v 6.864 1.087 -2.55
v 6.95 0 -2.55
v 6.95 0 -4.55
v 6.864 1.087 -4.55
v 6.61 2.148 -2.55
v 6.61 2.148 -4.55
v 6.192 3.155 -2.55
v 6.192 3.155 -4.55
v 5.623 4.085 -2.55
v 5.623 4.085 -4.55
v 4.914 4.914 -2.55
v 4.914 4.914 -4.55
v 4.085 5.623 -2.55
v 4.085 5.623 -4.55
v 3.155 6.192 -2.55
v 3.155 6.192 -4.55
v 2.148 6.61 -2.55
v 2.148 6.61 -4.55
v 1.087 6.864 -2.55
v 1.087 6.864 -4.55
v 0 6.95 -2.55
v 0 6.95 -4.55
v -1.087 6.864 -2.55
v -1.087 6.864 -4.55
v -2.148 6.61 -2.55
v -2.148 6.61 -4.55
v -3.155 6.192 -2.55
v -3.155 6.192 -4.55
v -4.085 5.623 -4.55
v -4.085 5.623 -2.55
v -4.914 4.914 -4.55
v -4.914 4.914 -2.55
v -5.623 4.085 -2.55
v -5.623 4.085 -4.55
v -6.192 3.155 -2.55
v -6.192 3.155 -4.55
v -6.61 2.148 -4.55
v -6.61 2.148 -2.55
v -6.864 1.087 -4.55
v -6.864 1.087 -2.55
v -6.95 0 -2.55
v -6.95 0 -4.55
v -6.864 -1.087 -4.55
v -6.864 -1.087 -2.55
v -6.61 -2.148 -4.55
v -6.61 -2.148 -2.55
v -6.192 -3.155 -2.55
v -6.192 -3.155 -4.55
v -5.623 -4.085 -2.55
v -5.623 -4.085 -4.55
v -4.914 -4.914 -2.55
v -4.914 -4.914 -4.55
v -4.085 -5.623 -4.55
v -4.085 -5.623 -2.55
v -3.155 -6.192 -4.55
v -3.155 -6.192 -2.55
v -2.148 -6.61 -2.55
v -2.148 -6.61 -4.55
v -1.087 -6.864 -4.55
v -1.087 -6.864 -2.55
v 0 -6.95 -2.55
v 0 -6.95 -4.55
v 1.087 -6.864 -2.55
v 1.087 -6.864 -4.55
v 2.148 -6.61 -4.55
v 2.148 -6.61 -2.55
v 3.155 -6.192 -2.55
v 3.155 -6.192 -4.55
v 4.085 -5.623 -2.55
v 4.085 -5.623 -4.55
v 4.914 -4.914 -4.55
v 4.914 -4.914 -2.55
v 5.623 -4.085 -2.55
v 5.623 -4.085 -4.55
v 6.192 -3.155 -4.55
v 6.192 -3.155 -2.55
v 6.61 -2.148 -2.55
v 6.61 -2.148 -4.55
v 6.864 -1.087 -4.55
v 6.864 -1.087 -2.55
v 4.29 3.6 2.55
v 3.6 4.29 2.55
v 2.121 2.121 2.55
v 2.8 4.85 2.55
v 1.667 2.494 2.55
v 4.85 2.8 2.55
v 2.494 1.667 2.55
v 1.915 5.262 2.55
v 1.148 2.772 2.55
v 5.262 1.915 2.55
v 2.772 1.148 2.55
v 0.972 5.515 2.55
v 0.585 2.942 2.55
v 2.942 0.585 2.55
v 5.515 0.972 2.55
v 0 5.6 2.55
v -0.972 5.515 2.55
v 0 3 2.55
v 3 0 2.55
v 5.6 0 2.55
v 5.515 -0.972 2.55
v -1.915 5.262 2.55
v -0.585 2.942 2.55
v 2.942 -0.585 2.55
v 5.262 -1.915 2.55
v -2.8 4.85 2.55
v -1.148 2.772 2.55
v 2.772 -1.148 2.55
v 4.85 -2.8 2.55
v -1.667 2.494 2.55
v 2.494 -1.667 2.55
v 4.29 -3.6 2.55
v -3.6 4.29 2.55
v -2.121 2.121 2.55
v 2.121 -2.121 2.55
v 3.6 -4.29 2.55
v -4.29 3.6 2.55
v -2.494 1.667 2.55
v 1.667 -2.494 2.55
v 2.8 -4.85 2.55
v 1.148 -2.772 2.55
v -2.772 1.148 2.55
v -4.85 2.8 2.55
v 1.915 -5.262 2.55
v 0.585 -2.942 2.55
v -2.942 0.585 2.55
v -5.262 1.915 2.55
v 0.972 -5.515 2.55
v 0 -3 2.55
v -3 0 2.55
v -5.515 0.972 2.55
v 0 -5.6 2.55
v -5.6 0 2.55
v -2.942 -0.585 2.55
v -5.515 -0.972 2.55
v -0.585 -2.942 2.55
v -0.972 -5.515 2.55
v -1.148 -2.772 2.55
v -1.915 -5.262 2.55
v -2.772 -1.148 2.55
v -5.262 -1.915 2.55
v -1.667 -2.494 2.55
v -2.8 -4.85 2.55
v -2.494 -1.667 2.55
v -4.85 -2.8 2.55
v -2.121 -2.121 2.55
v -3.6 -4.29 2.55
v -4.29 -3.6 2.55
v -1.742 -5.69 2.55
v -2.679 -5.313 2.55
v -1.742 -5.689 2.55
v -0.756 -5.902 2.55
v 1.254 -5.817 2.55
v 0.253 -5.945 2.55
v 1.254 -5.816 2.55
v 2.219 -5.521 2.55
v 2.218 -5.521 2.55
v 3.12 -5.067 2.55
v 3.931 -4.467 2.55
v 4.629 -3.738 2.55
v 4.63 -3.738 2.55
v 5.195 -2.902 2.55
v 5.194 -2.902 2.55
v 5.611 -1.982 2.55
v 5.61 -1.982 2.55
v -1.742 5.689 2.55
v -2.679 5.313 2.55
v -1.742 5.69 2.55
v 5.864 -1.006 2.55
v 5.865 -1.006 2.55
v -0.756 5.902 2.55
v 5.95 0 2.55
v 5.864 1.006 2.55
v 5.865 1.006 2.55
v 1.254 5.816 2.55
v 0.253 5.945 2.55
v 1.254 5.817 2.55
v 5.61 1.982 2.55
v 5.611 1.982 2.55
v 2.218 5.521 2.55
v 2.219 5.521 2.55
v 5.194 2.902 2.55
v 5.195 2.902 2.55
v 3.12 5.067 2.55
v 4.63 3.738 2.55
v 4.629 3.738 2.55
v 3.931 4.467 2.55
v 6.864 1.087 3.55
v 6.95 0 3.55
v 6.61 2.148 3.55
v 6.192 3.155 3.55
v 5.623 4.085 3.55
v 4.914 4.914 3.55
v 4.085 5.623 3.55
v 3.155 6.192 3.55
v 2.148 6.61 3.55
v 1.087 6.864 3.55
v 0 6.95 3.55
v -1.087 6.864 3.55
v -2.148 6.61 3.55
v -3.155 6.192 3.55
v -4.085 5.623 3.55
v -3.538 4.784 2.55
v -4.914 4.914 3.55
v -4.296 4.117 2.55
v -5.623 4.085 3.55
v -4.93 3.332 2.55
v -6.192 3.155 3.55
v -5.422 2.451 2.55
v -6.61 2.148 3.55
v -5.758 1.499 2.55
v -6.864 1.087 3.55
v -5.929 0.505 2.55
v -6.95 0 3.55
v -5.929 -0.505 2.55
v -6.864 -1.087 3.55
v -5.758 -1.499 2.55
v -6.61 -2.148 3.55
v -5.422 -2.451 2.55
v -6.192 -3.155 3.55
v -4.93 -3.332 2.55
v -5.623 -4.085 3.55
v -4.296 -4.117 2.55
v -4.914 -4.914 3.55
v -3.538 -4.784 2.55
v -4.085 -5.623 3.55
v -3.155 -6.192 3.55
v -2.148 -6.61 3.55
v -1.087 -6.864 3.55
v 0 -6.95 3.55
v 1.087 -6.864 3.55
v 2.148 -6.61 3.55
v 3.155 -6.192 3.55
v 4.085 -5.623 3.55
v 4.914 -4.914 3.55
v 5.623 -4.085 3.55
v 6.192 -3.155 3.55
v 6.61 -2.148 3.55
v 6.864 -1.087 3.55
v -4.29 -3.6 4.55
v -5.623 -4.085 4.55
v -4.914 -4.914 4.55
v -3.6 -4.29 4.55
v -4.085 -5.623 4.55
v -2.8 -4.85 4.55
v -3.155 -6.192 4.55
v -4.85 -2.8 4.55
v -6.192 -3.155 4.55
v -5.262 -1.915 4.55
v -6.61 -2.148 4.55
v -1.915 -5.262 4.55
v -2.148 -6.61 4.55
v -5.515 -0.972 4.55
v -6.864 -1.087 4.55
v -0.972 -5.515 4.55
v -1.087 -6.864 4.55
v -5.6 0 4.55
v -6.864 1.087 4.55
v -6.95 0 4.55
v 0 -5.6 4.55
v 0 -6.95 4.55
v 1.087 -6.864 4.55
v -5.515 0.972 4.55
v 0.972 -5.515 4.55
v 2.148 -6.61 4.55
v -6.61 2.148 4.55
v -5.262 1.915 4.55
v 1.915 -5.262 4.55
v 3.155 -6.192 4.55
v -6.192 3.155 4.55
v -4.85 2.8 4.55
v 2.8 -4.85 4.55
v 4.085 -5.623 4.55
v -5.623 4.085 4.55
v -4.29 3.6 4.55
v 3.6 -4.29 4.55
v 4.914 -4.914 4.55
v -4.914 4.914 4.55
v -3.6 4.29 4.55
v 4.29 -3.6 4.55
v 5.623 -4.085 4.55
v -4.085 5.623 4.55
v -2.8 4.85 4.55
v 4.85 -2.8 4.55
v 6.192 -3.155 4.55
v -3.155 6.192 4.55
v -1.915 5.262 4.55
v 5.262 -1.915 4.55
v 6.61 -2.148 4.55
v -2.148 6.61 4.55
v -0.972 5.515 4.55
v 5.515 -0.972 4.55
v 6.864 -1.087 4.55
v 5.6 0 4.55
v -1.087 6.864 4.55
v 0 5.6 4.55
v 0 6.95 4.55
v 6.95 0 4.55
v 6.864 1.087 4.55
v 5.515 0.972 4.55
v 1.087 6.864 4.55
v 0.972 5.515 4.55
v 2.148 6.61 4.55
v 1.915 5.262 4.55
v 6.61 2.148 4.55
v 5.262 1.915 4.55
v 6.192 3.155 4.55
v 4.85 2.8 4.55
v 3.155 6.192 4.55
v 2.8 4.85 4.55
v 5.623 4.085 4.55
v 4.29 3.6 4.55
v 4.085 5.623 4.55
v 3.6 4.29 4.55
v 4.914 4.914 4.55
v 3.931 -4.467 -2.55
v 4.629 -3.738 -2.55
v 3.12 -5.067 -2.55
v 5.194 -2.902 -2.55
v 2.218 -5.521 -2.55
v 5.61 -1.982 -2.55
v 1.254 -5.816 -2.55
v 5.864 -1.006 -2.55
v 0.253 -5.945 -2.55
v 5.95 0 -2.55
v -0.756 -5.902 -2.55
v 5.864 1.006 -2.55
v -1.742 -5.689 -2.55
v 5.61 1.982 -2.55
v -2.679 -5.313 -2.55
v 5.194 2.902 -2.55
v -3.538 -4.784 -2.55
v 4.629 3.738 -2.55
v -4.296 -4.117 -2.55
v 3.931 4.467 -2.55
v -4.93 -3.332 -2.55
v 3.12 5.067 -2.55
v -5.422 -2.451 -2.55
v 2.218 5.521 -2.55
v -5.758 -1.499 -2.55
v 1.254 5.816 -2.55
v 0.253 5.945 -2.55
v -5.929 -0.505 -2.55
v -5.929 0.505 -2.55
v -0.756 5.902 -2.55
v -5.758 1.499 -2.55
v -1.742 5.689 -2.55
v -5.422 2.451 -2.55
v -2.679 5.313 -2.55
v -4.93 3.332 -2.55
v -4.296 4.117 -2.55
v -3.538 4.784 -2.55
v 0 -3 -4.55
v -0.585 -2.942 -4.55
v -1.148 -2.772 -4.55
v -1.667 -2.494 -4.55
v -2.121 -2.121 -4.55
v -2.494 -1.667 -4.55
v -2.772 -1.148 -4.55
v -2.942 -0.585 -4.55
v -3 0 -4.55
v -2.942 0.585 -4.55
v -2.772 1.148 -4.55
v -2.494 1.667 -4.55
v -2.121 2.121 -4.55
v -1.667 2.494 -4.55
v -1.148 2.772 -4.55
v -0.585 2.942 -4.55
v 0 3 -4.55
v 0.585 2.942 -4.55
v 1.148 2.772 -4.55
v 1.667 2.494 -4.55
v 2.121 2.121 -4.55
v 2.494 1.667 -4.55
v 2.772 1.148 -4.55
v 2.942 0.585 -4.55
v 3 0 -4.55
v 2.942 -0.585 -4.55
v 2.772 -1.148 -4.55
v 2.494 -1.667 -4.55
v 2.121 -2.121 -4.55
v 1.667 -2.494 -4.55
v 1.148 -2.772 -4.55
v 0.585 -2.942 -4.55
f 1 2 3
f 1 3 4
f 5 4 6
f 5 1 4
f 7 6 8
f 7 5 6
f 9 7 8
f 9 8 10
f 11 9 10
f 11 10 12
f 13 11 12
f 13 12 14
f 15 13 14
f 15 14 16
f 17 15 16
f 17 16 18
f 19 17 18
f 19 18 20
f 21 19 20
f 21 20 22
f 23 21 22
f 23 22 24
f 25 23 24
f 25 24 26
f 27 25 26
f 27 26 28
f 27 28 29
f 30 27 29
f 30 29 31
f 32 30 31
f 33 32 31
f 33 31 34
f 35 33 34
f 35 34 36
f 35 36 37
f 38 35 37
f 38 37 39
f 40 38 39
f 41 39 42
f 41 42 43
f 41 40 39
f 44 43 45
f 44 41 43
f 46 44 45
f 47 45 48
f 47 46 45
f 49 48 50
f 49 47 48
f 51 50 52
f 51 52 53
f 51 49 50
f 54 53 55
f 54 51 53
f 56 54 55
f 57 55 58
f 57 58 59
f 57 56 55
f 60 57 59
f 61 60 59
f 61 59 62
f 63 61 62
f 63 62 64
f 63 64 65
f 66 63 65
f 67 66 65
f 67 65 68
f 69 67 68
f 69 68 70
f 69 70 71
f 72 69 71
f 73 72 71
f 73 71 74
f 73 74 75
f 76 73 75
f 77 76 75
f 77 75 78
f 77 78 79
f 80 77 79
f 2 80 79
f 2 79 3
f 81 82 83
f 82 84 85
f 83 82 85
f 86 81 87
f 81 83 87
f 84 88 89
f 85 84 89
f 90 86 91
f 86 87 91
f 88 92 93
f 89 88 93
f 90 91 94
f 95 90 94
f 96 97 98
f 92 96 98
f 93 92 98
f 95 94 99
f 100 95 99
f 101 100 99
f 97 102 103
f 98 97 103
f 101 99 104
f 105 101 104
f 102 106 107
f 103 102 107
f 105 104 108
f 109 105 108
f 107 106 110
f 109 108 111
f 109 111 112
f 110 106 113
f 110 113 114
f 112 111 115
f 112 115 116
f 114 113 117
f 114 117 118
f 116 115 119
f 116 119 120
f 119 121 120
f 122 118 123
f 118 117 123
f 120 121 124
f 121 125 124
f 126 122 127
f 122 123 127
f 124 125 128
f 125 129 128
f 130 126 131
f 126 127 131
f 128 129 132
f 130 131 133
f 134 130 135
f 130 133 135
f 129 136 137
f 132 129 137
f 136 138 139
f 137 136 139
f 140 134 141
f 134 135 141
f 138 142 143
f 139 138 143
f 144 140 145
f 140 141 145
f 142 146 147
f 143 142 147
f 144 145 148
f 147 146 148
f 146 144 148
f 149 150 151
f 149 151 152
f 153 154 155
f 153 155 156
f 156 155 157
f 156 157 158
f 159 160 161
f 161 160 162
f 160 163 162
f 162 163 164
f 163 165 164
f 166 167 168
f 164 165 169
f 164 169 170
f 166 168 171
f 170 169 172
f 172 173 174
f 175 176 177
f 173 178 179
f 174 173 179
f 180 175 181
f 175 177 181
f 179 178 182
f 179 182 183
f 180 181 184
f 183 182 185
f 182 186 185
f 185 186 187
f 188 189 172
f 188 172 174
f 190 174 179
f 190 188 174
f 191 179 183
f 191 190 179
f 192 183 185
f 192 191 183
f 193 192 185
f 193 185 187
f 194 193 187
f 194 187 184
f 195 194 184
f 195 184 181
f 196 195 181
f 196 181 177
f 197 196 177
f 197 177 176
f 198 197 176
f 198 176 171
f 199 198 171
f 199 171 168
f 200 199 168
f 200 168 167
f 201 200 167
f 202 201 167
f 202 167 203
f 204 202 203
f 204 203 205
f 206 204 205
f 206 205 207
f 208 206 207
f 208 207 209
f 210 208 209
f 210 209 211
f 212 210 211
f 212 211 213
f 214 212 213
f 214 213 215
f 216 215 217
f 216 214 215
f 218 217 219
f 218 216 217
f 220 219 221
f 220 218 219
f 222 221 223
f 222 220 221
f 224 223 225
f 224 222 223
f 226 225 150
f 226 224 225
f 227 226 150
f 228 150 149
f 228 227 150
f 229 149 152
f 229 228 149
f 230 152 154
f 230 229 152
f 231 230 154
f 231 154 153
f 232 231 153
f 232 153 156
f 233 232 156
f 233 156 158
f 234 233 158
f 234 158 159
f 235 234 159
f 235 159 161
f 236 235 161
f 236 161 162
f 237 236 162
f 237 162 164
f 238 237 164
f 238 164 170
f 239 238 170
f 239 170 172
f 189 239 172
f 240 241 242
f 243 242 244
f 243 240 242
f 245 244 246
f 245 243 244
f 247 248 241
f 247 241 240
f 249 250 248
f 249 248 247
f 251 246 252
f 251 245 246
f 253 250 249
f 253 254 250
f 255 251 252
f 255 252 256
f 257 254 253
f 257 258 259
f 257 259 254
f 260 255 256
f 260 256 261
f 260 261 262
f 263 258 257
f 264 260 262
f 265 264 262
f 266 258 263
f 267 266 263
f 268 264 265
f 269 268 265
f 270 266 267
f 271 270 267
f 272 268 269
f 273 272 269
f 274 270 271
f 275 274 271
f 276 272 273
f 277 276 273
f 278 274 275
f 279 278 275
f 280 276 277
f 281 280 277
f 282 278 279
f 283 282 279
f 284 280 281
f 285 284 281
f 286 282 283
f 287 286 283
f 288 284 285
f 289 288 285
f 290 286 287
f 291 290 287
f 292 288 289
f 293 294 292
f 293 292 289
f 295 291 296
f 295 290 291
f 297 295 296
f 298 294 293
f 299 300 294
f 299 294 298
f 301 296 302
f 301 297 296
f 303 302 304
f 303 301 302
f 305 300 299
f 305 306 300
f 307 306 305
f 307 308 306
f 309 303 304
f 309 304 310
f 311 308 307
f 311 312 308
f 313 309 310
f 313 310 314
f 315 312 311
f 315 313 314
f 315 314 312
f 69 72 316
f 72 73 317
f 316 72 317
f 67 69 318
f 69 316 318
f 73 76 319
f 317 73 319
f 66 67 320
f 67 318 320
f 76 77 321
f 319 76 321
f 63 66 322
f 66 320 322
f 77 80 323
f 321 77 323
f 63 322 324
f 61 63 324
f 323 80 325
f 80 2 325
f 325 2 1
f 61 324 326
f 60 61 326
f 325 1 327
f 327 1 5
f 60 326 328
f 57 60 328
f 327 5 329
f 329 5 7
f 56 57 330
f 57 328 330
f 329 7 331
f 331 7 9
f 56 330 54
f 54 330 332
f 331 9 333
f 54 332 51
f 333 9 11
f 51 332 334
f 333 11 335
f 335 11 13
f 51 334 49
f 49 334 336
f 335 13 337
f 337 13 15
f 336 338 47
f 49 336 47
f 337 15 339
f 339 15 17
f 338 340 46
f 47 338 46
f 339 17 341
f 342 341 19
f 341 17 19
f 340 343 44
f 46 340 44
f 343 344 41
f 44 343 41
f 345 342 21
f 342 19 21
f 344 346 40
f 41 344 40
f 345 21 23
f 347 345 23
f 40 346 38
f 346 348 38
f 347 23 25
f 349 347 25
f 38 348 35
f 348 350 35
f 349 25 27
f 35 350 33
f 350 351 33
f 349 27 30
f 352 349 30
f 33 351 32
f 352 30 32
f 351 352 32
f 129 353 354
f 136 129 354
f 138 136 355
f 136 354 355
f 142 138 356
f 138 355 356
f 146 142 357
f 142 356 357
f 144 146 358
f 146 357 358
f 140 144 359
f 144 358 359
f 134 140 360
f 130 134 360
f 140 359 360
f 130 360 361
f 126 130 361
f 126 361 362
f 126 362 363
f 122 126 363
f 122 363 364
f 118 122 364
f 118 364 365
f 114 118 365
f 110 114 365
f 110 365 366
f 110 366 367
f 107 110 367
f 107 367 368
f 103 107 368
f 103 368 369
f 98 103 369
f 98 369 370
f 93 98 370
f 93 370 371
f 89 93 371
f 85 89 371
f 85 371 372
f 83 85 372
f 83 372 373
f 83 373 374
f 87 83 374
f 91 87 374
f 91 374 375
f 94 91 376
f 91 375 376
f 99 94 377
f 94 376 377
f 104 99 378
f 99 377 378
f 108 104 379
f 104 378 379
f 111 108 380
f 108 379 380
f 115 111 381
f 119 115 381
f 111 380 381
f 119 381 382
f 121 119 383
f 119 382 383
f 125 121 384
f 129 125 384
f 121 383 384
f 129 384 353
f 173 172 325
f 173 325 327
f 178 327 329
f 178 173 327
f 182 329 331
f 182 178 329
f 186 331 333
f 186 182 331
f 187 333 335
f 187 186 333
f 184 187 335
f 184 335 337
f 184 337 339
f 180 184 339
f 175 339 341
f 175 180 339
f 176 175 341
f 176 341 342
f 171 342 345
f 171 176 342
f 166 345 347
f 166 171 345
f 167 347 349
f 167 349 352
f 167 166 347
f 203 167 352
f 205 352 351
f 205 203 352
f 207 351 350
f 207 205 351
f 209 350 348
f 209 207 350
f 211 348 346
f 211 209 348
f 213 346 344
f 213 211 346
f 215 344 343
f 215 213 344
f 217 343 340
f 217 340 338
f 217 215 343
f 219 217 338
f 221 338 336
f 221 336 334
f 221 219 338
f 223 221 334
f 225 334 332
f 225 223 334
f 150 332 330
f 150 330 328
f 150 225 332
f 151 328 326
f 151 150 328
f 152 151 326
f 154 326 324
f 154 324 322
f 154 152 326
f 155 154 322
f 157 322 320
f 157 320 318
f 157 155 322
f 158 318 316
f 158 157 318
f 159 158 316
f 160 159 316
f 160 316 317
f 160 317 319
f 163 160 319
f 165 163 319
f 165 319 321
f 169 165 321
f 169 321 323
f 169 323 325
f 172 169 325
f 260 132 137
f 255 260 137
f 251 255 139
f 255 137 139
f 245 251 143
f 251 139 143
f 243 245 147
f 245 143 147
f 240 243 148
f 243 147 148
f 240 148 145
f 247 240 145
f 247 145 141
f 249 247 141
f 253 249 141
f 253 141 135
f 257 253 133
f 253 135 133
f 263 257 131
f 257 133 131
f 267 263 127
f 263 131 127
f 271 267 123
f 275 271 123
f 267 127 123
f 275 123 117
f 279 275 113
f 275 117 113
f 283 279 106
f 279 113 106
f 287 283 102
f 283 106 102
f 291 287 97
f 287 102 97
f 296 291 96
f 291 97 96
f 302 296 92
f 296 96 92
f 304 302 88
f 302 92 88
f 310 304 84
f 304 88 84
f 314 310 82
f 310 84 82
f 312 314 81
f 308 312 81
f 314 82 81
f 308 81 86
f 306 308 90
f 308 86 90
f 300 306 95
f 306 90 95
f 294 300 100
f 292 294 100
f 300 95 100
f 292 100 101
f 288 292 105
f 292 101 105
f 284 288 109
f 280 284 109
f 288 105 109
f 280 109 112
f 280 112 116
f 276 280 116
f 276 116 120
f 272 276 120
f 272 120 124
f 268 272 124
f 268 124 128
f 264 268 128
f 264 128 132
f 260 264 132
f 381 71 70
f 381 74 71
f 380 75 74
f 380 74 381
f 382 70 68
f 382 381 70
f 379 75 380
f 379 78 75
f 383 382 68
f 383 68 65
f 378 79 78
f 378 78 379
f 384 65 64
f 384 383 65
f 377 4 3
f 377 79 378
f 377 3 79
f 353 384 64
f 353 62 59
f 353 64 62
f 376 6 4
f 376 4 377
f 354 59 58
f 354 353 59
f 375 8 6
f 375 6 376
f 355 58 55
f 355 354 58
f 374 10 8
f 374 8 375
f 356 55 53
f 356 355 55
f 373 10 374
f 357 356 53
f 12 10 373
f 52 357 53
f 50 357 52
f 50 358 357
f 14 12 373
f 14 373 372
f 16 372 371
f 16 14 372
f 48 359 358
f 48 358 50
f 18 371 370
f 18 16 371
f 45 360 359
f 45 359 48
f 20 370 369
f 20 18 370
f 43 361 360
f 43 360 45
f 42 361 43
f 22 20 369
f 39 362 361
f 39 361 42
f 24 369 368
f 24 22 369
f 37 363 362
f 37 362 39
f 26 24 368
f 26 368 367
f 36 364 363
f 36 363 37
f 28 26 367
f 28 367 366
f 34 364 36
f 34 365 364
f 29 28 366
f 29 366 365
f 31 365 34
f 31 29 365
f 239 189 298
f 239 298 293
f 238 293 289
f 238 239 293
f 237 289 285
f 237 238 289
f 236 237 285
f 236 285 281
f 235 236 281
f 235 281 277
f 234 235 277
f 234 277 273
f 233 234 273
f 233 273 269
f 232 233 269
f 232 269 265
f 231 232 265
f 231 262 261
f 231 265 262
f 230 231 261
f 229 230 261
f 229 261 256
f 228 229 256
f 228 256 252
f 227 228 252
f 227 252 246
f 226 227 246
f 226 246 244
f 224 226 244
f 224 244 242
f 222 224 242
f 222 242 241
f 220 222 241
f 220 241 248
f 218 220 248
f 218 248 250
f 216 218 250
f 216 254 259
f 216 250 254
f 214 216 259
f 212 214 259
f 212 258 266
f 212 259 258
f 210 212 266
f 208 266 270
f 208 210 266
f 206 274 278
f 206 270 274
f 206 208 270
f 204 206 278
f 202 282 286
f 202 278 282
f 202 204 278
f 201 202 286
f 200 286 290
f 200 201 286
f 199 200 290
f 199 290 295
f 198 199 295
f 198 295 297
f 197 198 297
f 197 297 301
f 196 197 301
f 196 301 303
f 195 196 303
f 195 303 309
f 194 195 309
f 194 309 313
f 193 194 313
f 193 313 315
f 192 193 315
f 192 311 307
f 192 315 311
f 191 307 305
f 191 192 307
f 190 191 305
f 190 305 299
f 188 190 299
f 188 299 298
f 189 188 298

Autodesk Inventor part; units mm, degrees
ref_plane "YZ Plane" through (0, 0, 0) normal (1, 0, 0) x (0, 1, 0)
ref_plane "XZ Plane" through (0, 0, 0) normal (0, 1, 0) x (-1, 0, 0)
ref_plane "XY Plane" through (0, 0, 0) normal (0, 0, 1) x (1, 0, 0)
sketch "Skizze1" plane through (0, 0, 0) normal (0, 0, 1) x (1, 0, 0)
  circle A0 centre (0, 0) radius 5.95
  dimension "d0" = 11.9
extrude "Extrusion1" add sketch "Skizze1" along normal blind 2.55
sketch "Skizze2" plane through (0, 0, 2.55) normal (0, 0, 1) x (1, 0, 0)
  circle A0 centre (0, 0) radius 6.95
  circle A1 centre (0, 0) radius 5.95 projected
  dimension "d5" = 1
extrude "Extrusion2" add sketch "Skizze2" along normal blind 2 contours A0 | A1
mirror "Spiegeln1" about plane through (0, 0, 0) normal (0, 0, -1) of "Extrusion2", "Extrusion1"
sketch "Skizze3" plane through (0, 0, 4.55) normal (0, 0, 1) x (1, 0, 0)
  point P0 (0, 0)
  point P1 (0, 0)
hole "Bohrung1" at (0, 0, 4.55) direction (0, 0, -1) diameter 6 end through all counterbore diameter 11.2 counterbore depth 2
chamfer "Fasen1" distance 1 angle 45 1 edges at (-6.95, 0, 2.55)
properties part number "SolarPlugAdapter"
